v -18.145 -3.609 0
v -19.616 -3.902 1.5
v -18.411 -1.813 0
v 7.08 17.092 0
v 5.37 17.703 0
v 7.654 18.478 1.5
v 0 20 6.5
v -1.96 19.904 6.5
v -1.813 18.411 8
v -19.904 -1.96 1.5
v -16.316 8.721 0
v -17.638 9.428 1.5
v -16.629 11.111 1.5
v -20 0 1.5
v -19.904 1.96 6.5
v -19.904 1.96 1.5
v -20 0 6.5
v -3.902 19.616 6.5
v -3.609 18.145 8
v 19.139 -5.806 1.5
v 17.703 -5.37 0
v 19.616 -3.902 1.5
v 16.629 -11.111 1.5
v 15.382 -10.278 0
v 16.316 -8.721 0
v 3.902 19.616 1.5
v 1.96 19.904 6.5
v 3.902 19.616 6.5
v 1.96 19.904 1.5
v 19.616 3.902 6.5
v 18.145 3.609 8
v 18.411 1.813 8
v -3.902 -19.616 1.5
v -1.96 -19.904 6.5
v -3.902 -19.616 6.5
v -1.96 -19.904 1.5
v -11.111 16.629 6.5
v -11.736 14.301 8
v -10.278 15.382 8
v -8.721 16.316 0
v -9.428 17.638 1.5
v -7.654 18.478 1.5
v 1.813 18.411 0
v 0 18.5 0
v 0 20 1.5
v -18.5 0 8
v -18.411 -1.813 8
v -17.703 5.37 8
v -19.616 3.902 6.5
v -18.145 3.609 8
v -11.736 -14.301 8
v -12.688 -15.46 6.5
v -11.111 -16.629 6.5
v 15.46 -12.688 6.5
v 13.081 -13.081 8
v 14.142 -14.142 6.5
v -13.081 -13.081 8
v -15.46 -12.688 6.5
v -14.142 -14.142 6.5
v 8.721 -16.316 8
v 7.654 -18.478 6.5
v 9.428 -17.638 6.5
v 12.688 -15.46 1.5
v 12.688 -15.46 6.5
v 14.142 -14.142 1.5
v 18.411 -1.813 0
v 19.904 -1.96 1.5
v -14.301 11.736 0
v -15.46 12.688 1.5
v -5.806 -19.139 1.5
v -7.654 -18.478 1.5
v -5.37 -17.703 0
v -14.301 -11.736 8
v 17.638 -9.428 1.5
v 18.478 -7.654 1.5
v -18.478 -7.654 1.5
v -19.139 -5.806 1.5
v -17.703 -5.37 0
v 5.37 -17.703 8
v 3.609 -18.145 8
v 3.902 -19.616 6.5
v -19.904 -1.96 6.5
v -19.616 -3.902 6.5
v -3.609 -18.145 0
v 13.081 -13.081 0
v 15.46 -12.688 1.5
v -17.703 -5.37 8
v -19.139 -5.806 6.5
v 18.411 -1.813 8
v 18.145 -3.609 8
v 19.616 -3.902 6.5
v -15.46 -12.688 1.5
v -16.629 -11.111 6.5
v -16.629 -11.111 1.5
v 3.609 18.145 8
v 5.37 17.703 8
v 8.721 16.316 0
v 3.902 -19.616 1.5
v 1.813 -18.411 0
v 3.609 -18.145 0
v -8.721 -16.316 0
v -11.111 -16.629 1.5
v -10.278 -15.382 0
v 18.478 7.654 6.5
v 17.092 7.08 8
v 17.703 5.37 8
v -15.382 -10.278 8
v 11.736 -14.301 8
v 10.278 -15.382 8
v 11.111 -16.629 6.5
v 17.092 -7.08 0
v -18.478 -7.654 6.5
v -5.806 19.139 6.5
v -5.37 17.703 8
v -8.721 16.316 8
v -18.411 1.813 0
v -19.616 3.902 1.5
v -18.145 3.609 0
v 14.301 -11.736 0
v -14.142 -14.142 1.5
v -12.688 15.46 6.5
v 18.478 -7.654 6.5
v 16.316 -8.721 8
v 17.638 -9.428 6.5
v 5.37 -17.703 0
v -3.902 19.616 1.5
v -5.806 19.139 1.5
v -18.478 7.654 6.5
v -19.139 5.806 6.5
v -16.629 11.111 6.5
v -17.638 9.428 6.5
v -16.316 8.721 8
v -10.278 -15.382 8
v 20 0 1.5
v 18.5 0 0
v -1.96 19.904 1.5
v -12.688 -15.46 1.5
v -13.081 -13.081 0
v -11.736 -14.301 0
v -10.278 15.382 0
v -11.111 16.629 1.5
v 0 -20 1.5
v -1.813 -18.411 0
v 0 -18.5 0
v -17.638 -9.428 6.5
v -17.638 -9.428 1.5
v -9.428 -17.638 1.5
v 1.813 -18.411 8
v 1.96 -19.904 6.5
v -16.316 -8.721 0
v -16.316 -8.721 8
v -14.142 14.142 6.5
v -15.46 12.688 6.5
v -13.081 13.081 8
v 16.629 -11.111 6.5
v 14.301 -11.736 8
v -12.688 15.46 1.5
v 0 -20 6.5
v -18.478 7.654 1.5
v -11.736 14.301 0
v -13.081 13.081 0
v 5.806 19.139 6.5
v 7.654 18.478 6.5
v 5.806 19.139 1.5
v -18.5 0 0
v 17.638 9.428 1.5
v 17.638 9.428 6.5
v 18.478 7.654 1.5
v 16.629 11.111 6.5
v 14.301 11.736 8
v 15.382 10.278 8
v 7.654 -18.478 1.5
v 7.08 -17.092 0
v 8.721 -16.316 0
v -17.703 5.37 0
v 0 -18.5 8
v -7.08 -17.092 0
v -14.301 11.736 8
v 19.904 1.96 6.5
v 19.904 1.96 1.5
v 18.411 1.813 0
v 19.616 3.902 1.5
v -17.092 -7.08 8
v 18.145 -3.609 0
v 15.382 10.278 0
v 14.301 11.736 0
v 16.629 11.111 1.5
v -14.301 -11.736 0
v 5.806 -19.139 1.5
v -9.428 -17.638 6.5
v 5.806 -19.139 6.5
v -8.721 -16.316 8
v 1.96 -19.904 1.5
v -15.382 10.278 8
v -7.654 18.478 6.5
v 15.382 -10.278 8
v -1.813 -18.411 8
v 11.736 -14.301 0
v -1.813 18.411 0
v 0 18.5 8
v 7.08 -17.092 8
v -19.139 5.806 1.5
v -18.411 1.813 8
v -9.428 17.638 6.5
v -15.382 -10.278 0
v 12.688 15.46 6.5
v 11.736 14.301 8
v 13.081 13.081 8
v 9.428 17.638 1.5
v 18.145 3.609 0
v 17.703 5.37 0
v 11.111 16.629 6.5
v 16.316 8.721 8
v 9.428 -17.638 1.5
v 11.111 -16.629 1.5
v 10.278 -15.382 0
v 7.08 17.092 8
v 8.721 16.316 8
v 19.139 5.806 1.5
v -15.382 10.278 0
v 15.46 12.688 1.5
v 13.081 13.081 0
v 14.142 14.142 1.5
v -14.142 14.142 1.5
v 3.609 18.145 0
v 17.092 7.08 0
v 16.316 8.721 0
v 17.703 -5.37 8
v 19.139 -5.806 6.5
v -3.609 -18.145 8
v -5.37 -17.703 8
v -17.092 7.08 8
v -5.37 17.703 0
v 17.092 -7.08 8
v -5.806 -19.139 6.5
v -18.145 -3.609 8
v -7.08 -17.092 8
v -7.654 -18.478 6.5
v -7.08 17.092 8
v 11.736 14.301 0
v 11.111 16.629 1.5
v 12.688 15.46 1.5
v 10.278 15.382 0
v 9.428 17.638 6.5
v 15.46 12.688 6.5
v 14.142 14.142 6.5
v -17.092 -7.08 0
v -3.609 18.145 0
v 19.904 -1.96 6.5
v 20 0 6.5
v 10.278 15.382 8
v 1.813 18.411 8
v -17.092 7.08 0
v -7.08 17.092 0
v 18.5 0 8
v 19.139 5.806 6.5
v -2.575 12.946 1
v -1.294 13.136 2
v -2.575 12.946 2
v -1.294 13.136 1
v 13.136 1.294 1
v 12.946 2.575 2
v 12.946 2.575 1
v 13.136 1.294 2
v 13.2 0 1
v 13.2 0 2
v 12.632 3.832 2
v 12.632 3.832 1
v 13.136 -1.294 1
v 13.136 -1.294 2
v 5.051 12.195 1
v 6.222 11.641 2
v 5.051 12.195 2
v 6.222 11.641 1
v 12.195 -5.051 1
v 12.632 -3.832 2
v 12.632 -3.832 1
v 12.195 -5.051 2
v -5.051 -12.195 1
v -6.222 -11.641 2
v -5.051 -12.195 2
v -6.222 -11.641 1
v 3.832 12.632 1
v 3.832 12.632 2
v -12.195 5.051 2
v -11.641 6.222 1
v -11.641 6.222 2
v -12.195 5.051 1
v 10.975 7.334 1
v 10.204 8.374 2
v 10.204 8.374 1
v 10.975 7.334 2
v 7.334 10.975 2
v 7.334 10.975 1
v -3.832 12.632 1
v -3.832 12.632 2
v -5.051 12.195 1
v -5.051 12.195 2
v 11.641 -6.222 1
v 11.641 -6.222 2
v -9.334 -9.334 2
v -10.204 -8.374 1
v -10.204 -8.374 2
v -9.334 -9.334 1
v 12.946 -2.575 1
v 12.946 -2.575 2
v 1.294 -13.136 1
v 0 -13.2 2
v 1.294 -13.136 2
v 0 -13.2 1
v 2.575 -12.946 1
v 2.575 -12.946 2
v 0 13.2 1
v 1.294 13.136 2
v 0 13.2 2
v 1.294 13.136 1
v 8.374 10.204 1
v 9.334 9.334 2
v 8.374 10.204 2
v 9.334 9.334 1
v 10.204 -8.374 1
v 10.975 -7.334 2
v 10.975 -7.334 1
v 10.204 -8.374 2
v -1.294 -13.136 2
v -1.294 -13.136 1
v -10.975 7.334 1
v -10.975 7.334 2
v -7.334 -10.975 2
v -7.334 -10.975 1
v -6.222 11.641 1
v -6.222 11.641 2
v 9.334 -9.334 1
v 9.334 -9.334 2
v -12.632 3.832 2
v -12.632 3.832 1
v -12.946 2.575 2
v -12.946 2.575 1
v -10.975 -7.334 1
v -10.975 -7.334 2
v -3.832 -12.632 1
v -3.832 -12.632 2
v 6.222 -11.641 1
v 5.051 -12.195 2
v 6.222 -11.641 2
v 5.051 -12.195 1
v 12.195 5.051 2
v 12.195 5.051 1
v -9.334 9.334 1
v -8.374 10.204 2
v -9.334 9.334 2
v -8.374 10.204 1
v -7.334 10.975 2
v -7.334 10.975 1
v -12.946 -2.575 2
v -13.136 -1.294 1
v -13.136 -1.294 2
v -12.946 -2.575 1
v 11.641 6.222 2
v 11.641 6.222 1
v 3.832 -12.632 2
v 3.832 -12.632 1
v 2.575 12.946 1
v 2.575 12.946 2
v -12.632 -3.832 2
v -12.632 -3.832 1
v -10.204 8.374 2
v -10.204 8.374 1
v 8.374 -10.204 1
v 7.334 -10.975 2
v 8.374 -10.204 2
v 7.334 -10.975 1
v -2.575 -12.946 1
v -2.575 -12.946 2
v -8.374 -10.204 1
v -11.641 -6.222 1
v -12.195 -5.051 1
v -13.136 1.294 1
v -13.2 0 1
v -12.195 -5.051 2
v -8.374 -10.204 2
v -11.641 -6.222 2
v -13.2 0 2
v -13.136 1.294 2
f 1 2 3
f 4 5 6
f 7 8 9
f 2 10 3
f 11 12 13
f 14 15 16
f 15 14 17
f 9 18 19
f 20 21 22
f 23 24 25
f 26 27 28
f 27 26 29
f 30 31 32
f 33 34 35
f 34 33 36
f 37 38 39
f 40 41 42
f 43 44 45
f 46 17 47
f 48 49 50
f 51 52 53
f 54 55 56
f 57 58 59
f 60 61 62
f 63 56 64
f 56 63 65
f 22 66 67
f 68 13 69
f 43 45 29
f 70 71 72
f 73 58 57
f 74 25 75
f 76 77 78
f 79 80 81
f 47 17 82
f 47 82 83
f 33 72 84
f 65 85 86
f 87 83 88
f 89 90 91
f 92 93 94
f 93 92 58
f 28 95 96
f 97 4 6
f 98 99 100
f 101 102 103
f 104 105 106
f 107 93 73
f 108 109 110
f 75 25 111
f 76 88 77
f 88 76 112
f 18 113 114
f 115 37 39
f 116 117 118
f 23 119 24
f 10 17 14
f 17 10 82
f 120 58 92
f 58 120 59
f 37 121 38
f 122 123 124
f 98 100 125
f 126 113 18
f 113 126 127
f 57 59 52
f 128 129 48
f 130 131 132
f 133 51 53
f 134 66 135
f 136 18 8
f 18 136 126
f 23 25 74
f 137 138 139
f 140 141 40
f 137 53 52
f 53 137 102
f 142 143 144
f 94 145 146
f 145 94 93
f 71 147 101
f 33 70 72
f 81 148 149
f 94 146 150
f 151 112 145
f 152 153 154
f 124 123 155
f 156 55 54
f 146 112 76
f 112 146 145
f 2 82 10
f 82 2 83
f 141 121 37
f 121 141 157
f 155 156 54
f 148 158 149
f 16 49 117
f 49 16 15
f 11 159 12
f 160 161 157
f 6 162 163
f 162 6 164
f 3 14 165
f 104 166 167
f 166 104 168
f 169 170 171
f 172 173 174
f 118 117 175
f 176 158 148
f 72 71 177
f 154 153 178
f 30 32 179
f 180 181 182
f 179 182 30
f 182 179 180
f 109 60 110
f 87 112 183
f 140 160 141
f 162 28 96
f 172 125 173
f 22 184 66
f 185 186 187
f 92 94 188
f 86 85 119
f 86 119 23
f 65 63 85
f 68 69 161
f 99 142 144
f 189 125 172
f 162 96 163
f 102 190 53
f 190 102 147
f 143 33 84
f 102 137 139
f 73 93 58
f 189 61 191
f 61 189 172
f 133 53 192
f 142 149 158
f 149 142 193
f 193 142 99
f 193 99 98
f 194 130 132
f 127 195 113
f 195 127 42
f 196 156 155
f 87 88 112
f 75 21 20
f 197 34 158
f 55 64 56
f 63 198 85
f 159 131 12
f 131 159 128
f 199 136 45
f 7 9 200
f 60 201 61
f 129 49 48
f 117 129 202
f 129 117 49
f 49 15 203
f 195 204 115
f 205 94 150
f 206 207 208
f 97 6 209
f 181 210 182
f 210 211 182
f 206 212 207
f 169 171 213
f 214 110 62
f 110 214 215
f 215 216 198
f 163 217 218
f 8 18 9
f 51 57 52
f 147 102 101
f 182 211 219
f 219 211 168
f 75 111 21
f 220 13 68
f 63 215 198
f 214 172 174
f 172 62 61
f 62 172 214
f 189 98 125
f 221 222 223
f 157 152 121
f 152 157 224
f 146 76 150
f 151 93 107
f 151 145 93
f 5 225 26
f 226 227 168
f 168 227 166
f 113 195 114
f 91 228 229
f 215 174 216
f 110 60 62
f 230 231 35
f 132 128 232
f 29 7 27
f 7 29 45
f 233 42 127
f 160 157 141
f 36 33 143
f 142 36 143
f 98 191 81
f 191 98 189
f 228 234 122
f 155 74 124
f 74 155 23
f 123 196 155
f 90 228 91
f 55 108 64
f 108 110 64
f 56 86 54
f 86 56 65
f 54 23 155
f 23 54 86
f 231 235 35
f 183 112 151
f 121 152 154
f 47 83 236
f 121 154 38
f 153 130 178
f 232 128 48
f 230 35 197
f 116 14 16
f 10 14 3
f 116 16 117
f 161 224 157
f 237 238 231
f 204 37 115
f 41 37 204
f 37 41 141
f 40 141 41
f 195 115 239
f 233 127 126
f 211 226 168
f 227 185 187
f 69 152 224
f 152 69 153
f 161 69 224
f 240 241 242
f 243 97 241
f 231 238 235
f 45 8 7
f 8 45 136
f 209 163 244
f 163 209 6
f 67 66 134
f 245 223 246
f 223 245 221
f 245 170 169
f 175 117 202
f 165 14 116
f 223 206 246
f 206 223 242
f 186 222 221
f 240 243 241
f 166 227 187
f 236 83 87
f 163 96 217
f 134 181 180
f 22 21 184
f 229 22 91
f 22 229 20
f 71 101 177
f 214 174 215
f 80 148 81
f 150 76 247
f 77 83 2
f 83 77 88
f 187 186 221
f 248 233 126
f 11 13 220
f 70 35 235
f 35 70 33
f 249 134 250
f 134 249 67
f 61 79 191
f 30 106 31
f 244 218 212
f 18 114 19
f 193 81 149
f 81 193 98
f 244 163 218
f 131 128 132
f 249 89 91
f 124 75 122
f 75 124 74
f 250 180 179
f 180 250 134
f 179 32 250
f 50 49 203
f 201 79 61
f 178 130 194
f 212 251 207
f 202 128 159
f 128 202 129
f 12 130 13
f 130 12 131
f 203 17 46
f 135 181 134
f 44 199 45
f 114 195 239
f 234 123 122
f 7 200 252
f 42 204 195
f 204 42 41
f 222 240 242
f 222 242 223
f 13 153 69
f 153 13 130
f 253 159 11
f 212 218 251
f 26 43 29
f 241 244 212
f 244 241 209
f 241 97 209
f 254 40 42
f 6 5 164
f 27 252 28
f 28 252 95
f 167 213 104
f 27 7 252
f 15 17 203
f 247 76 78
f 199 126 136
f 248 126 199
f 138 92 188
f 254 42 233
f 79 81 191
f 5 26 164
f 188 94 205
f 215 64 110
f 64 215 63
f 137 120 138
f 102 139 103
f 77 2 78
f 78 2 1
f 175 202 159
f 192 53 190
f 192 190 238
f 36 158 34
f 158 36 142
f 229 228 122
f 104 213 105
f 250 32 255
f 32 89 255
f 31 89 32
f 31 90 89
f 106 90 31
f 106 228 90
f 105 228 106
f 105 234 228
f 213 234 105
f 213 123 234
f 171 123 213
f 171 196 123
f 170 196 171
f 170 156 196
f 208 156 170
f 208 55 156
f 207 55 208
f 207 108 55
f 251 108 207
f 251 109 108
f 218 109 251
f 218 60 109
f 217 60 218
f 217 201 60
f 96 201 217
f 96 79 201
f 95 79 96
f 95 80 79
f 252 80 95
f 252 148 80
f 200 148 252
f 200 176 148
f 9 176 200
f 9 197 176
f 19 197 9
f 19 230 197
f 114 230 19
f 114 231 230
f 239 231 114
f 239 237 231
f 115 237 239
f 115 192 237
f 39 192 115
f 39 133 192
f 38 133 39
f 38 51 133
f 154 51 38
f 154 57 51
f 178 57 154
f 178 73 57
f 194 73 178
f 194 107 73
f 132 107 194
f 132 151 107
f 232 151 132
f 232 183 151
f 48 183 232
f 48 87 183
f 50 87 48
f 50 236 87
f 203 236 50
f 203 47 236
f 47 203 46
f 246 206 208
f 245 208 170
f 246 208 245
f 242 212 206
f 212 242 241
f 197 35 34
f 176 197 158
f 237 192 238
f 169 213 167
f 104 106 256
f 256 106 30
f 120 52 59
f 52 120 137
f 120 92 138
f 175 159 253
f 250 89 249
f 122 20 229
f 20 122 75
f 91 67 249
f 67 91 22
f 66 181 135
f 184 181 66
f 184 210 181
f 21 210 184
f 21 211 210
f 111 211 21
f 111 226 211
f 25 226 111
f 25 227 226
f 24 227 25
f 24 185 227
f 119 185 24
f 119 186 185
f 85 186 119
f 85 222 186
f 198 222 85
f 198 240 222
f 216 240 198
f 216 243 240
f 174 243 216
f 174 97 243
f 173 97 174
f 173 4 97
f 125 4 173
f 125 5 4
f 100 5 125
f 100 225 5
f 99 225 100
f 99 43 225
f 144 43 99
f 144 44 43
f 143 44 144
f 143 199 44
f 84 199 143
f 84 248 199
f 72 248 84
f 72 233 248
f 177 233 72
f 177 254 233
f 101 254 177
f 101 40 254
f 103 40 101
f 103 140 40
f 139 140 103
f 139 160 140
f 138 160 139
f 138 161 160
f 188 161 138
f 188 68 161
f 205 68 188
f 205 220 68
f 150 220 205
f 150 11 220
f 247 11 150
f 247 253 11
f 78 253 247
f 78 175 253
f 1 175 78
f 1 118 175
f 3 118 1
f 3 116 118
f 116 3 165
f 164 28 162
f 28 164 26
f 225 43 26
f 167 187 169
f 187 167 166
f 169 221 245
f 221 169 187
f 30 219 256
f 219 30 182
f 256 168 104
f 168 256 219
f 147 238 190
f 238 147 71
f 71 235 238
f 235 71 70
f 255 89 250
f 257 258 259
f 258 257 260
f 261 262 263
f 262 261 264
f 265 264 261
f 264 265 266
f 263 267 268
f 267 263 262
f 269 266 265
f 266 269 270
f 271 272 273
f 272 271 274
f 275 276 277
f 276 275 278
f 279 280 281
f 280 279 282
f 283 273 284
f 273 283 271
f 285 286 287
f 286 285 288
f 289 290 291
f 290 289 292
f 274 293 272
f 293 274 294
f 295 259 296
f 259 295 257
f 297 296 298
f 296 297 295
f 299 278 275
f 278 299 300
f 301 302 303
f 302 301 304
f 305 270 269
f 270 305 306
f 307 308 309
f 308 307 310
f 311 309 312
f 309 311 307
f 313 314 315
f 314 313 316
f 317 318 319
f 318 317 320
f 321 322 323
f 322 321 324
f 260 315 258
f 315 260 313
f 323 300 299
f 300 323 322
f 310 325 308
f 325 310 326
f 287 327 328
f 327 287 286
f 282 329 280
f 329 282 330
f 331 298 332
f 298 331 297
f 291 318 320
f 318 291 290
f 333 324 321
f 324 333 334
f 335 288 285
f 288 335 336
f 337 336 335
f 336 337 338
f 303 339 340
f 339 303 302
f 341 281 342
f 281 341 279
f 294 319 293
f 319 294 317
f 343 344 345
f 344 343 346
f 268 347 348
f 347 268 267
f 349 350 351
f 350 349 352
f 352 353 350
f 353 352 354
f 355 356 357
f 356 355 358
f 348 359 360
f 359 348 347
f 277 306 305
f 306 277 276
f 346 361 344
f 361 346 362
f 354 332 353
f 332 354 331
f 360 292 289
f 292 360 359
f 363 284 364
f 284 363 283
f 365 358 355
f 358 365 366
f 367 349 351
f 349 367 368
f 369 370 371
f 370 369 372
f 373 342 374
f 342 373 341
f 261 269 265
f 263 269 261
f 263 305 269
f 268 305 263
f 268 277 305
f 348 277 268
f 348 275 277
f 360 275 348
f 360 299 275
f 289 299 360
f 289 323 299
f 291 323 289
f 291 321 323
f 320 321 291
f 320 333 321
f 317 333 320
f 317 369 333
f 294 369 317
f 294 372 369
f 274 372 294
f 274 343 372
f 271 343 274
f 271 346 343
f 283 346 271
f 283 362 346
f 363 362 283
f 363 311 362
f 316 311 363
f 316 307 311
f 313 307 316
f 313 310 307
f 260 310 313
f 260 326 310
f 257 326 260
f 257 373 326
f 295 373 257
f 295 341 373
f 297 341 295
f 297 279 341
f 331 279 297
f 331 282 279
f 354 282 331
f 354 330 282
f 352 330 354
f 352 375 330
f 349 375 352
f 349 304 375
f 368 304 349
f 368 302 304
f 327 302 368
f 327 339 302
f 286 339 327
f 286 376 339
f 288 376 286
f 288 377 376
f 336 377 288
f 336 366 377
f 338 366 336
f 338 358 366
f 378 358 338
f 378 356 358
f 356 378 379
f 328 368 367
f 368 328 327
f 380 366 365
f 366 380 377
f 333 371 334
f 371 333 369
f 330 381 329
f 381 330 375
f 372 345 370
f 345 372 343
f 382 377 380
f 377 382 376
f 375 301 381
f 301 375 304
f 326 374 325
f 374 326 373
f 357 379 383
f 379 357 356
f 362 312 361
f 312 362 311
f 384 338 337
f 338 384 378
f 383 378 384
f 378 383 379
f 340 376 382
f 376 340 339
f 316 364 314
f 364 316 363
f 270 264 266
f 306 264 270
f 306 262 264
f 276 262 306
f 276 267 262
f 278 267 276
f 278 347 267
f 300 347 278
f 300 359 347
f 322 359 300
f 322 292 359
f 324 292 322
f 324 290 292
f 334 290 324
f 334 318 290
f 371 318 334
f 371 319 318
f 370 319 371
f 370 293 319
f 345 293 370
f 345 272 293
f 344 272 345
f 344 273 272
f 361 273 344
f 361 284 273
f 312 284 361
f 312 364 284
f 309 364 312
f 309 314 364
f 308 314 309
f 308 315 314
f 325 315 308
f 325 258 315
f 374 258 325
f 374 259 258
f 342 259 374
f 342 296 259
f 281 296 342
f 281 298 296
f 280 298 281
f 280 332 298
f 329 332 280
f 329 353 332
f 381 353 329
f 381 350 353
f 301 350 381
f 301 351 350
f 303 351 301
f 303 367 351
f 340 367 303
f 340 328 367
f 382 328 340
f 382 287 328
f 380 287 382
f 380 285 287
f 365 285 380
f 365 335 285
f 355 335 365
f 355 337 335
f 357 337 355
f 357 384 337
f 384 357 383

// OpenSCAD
// file: ../../sorgenti/parametri.scad
// ============================================================
// parametri.scad — tutte le misure del progetto, in millimetri
// ------------------------------------------------------------
// Unica fonte di verità per la geometria: se cambia un
// componente, si cambia QUI e si rigenerano gli STL con
//   ./modelli-3d/genera-stl.sh
//
// Le misure marcate [VERIFICARE] vanno ricontrollate col
// calibro quando arrivano i pezzi, prima di stampare il case.
// ============================================================

// Risoluzione delle curve: 48 per lavorare, 96 per gli STL finali.
RISOLUZIONE = 64;

// ---------- Tolleranze di stampa (Kobra S2 / S3 Max, ugello 0,4) ----------
GIOCO        = 0.35;  // gioco fra due pezzi stampati che si accoppiano
GIOCO_FORO   = 0.25;  // sovramisura dei fori per i componenti
PARETE_MIN   = 1.6;   // spessore minimo di una parete portante (4 linee)

// ---------- Scocca ----------
// Scocca = pareti + coperchio in UN SOLO pezzo (si stampa capovolta).
// Il fondo è una piastra separata, avvitata dall'esterno.
BOX_X        = 130;   // larghezza
BOX_Y        = 130;   // profondità
BOX_Z        = 100;   // altezza totale, fondo compreso
PARETE       = 2.4;   // spessore pareti (3 perimetri a 0,8)
TOP_SP       = 5.0;   // spessore del coperchio (serve per il dado del tasto arcade)
RAGGIO_VERT  = 8;     // raggio degli angoli verticali (spec: >= 5)
RAGGIO_TOP   = 3;     // raccordo del bordo superiore
FONDO_SP     = 3.0;   // spessore della piastra di fondo
FONDO_INCASSO = FONDO_SP;  // il fondo è incassato e a filo con le pareti

// ---------- Zona NFC sul coperchio ----------
NFC_D        = 62;    // diametro dello scasso di appoggio
NFC_PROF     = 3.0;   // profondità dello scasso
NFC_X        = 0;     // posizione del centro (X=0 = centro scatola)
NFC_Y        = 28;    // spostato verso il retro, davanti ci stanno i comandi
NFC_TACCA_D  = 14;    // tacche laterali per sollevare il vinile con un dito
// Fondo dello scasso = TOP_SP - NFC_PROF = 2,0 mm (limite di specifica)

// ---------- Cursore volume (potenziometro a slitta B10K) ----------
CURSORE_CORSA   = 60;    // corsa utile [VERIFICARE sul pezzo]
CURSORE_LUNG    = 75;    // lunghezza totale del corpo [VERIFICARE]
CURSORE_LARG    = 9;     // larghezza del corpo [VERIFICARE]
CURSORE_ALT     = 9;     // altezza del corpo sopra il PCB [VERIFICARE]
CURSORE_LEVA_X  = 2.0;   // spessore della levetta
CURSORE_LEVA_Y  = 6.0;   // larghezza della levetta
CURSORE_FESSURA_W = 3.2; // larghezza della fessura nel coperchio
CURSORE_Y       = -16;   // posizione sul coperchio
CURSORE_Z_SOTTO = 7;     // quota del corpo del potenziometro sotto la faccia interna

// ---------- Tasti arcade ----------
// "30 mm" è il diametro del cappuccio: il foro di montaggio è 28 mm
// sui modelli con ghiera filettata. [VERIFICARE col pezzo in mano]
TASTO_FORO   = 28.0;
TASTO_CAPPUCCIO = 33;
TASTO_X      = 35;    // centri a +/- 35 -> 70 mm fra i centri
TASTO_Y      = -42;

// ---------- Display e-paper 2,13" (Waveshare 250x122) ----------
EPD_PCB_X    = 59.2;  // [VERIFICARE]
EPD_PCB_Z    = 29.2;  // [VERIFICARE]
EPD_PCB_SP   = 1.2;   // spessore del modulo senza componenti
EPD_FIN_X    = 50;    // finestra visibile (area attiva 48,55 x 23,7)
EPD_FIN_Z    = 25.5;
EPD_Z        = 76;    // quota del centro finestra sulla parete frontale
EPD_PARETE   = 1.2;   // parete sottile davanti al display (0 = finestra aperta)

// ---------- Altoparlante ----------
ALT_D        = 40;    // diametro esterno [VERIFICARE]
ALT_ALT      = 6;     // altezza col magnete [VERIFICARE]
ALT_Z        = 32;    // quota del centro sulla parete frontale
ALT_GRIGLIA_D   = 1.8; // fori della griglia (spec: <= 2 mm)
ALT_CAMERA_PROF = 12;  // profondità della camera chiusa dietro il cono
ALT_TUBO_OD     = 52;  // diametro esterno del tubo portaltoparlante
ALT_TUBO_LUNG   = 12;  // lunghezza del tubo verso l'interno
ALT_CAMERA_SEDE = 46.4;// controforo in cui si innesta la camera

// ---------- Lettore PN5180 ----------
// Fissato sotto il coperchio con biadesivo + nervature di contenimento.
// Le nervature sono aperte su un lato: il modulo entra a scorrere.
PN_X         = 58;    // ingombro del modulo, lato X [VERIFICARE]
PN_Y         = 47;    // ingombro del modulo, lato Y [VERIFICARE]
PN_ALT       = 8;     // altezza totale coi componenti [VERIFICARE]

// ---------- Retro: USB-C e microSD ----------
USB_X        = -28;   // posizione del centro sulla parete di fondo
USB_Z        = 18;
USB_W        = 11.0;  // foro per il connettore USB-C del TP4056
USB_H        = 6.0;
SD_X         = 28;
SD_Z         = 18;
SD_W         = 14.0;  // fessura di inserimento della microSD
SD_H         = 3.4;

// ---------- Fondo: interruttore, tasto genitori, vano batteria ----------
SW_X         = -40;   // interruttore a slitta da pannello
SW_Y         = -53;
SW_FORO_X    = 13.0;  // [VERIFICARE: SS12D00 o simile]
SW_FORO_Y    = 8.0;
SW_VITI      = 19.5;  // distanza fra le due viti di fissaggio
SW_INCASSO   = 1.6;   // incasso per non sporgere dal fondo

GEN_X        = 40;    // tasto genitori (tattile 6 mm), incassato
GEN_Y        = -53;
GEN_FORO_D   = 6.0;   // passa un polpastrello adulto, non la mano di un bimbo
GEN_POZZO_D  = 11;    // pozzetto di incasso
GEN_POZZO_H  = 1.8;

// Portabatteria con l'asse lungo su Y, sul lato destro: la basetta
// millefori gli passa sopra senza toccarlo.
BATT_HOLDER_X = 24;   // larghezza [VERIFICARE]
BATT_HOLDER_Y = 78;   // lunghezza [VERIFICARE]
BATT_HOLDER_Z = 20;
BATT_X        = 24;   // centro del vano batteria
BATT_Y        = 0;
SPORT_X       = 26;   // apertura dello sportellino batteria
SPORT_Y       = 72;
SPORT_PIASTRA_X = 40; // piastrina dello sportellino
SPORT_PIASTRA_Y = 82;
SPORT_SP      = 2.5;  // spessore dello sportellino
SPORT_RABBET  = 1.2;  // incasso dello sportellino (resta a filo)
SPORT_VITI_DX = 14;   // viti dello sportellino, scostamento da BATT_X
SPORT_VITI_DY = 36;
AUTOFIL_D     = 2.1;  // preforo per vite autofilettante M2,5 nel PETG

// ---------- Viti e inserti ----------
VITE_D       = 2.5;        // M2,5
VITE_FORO    = 2.8;        // passaggio della vite
VITE_TESTA_D = 5.0;        // svasatura della testa
INSERTO_D    = 3.6;        // inserto a caldo M2,5 [VERIFICARE col lotto]
INSERTO_H    = 5.0;
BOSS_D       = 7.5;        // diametro del pilastrino che ospita l'inserto
BOSS_OFF     = 6;          // distanza del pilastrino dalla parete interna

// ---------- Elettronica interna ----------
MILLEFORI_X  = 90;    // basetta millefori (90 x 70)
MILLEFORI_Y  = 70;
MILLEFORI_Z  = 28;    // quota della basetta sopra il fondo
MILLEFORI_SP = 1.6;
MILLEFORI_VITI_X = 41; // colonnine di sostegno
MILLEFORI_VITI_Y = 31;

// ---------- Statuine ----------
ST_BASE_D    = 40;    // cilindro di base
ST_BASE_H    = 8;
ST_TAG_D     = 25;    // tag NTAG213 adesivo
ST_TAG_SEDE_D = 26.4; // sede del tag, con gioco
ST_TAG_SEDE_H = 1.0;  // profondità della sede
ST_TAG_FONDO = 1.0;   // spessore sotto il tag (spec: 1 mm dal fondo)
ST_SMUSSO    = 1.5;   // smusso del bordo della base

// ---------- Vinili ----------
VIN_D        = 60;
VIN_H        = 4;
VIN_SOLCO_H  = 0.4;   // rilievo dei solchi
VIN_ETICH_D  = 24;    // etichetta centrale
VIN_RAGGIO   = 1.2;   // raccordo del bordo

// ---------- Calibro parti piccole (EN 71-1) ----------
CAL_D        = 31.7;
CAL_H_MIN    = 25.4;
CAL_H_MAX    = 57.1;
// file: ../../sorgenti/libreria.scad
// ============================================================
// libreria.scad — forme di base riusate da tutti i pezzi
// ============================================================
include <parametri.scad>

$fn = RISOLUZIONE;

// Prisma a sezione rettangolare con angoli arrotondati.
module piastra(x, y, h, r) {
    linear_extrude(height = h)
        offset(r = r) square([x - 2*r, y - 2*r], center = true);
}

// Scatola piena con angoli verticali arrotondati (rv) e bordo
// superiore raccordato (rt). Il raccordo è approssimato a gradini
// uniti con hull(): resta liscio e si stampa senza supporti.
module scatola_arrotondata(x, y, z, rv, rt, passi = 12) {
    union() {
        piastra(x, y, z - rt, rv);
        for (i = [0 : passi - 1]) {
            a0 = 90 * i / passi;
            a1 = 90 * (i + 1) / passi;
            k0 = rt * (1 - cos(a0));  k1 = rt * (1 - cos(a1));
            h0 = rt * sin(a0);        h1 = rt * sin(a1);
            hull() {
                translate([0, 0, z - rt + h0])
                    piastra(x - 2*k0, y - 2*k0, 0.02, max(rv - k0, 0.6));
                translate([0, 0, z - rt + h1])
                    piastra(x - 2*k1, y - 2*k1, 0.02, max(rv - k1, 0.6));
            }
        }
    }
}

// Foro di passaggio per vite con svasatura della testa (testa in basso,
// si avvita dal basso verso l'alto).
module foro_svasato(h = 10, d = VITE_FORO, testa_d = VITE_TESTA_D, testa_h = 1.6) {
    translate([0, 0, -0.1]) cylinder(h = h + 0.2, d = d);
    translate([0, 0, -0.1]) cylinder(h = testa_h + 0.1, d1 = testa_d, d2 = d);
}

// Pilastrino con sede per inserto a caldo M2,5 (si inserisce dal basso).
module boss_inserto(h = 12, d = BOSS_D) {
    difference() {
        cylinder(h = h, d = d);
        translate([0, 0, -0.1]) cylinder(h = INSERTO_H + 0.1, d = INSERTO_D);
        // scarico sopra l'inserto, per la punta della vite
        translate([0, 0, INSERTO_H]) cylinder(h = h, d = VITE_D + 0.4);
    }
}

// Griglia di fori a nido d'ape dentro un cerchio di diametro d_area.
module griglia_tonda(d_area, spessore, d_foro = ALT_GRIGLIA_D, passo = 3.2) {
    n = ceil(d_area / passo) + 2;
    for (i = [-n : n], j = [-n : n]) {
        x = i * passo + (abs(j) % 2) * passo / 2;
        y = j * passo * 0.866;
        if (sqrt(x*x + y*y) <= (d_area - d_foro) / 2)
            translate([x, y, -0.1]) cylinder(h = spessore + 0.2, d = d_foro);
    }
}

// Fessura allungata (slot) con estremi arrotondati, asse X.
module fessura(lung, larg, h) {
    hull() {
        translate([-(lung - larg)/2, 0, 0]) cylinder(h = h, d = larg);
        translate([ (lung - larg)/2, 0, 0]) cylinder(h = h, d = larg);
    }
}

// Scritta in rilievo (per i provini e le etichette).
module scritta(t, dim = 6, alt = 0.6) {
    linear_extrude(height = alt)
        text(t, size = dim, halign = "center", valign = "center",
             font = "Helvetica:style=Bold");
}

// Freccia piena, punta verso +X, usata per le icone dei tasti.
module freccia(lung = 16, larg = 14, alt = 0.8) {
    gambo = larg / 5;          // mezza larghezza del gambo
    testa = lung * 0.45;       // lunghezza della punta
    linear_extrude(height = alt)
        polygon([[-lung/2, -gambo], [lung/2 - testa, -gambo],
                 [lung/2 - testa, -larg/2], [lung/2, 0],
                 [lung/2 - testa, larg/2], [lung/2 - testa, gambo],
                 [-lung/2, gambo]]);
}

// Icona "volume": tre barrette crescenti, asse X.
module icona_volume(n = 3, alt = 0.8, passo = 3.2, base = 2.0, cresc = 1.6) {
    for (i = [0 : n - 1])
        translate([i * passo, 0, 0])
            linear_extrude(height = alt)
                square([1.8, base + i * cresc], center = true);
}

// Cava a sezione rettangolare arrotondata, asse di estrusione Y.
// Utile per finestre e fessure nelle pareti verticali.
module cava_y(x, z, prof, r = 1.5) {
    rotate([90, 0, 0])
        linear_extrude(height = prof, center = true)
            offset(r = r) square([x - 2*r, z - 2*r], center = true);
}

// Pilastrino che parte dal piano del fondo e ospita un inserto a caldo
// (inserito dal basso). La punta conica in alto lo rende stampabile
// anche a scatola capovolta.
module boss_fondo(h = 12) {
    union() {
        difference() {
            cylinder(h = h, d = BOSS_D);
            translate([0, 0, -0.1]) cylinder(h = INSERTO_H + 0.1, d = INSERTO_D);
            translate([0, 0, INSERTO_H]) cylinder(h = h, d = VITE_D + 0.6);
        }
        translate([0, 0, h]) cylinder(h = BOSS_D/2, d1 = BOSS_D, d2 = 0.4);
    }
}

// Pilastrino appeso al soffitto (coperchio): l'inserto entra dal basso.
module boss_soffitto(h = 7) {
    difference() {
        translate([0, 0, -h]) cylinder(h = h, d = BOSS_D);
        translate([0, 0, -h - 0.1]) cylinder(h = INSERTO_H + 0.1, d = INSERTO_D);
    }
}
// main file
// ============================================================
// base-statuina.scad — base con sede del tag NFC
// ------------------------------------------------------------
// Cilindro Ø40 x 8 con la sede del tag a 1 mm dal fondo: fra
// tag e antenna restano 1 mm di base + 2 mm di piatto NFC.
// Sopra ci va il personaggio (statuina-orso.scad) oppure si
// incolla una figurina comprata.
//
// STAMPA: appoggiata sul piano. Mettere una pausa (M600 /
// "change filament") alla quota Z = ST_TAG_FONDO + ST_TAG_SEDE_H
// (2,0 mm): si appoggia il tag nella sede e si riprende.
// In alternativa stampare con TAPPO = true e incollare il
// dischetto dopo aver messo il tag.
// ============================================================
include <../../sorgenti/libreria.scad>

TAPPO = false;   // true = sede aperta sotto + tappo da incollare

base_statuina();
if (TAPPO) translate([ST_BASE_D + 8, 0, 0]) tappo_base();

module base_statuina() {
    difference() {
        corpo_base();
        sede_tag();
    }
}

module corpo_base() {
    // cilindro con smussi sopra e sotto: nessuno spigolo vivo
    hull() {
        translate([0, 0, 0])
            cylinder(h = 0.01, d = ST_BASE_D - 2*ST_SMUSSO);
        translate([0, 0, ST_SMUSSO])
            cylinder(h = ST_BASE_H - 2*ST_SMUSSO, d = ST_BASE_D);
        translate([0, 0, ST_BASE_H - 0.01])
            cylinder(h = 0.01, d = ST_BASE_D - 2*ST_SMUSSO);
    }
}

module sede_tag() {
    if (TAPPO) {
        // sede aperta verso il basso, si chiude col tappo
        translate([0, 0, -0.1])
            cylinder(h = ST_TAG_FONDO + ST_TAG_SEDE_H + 0.1, d = ST_TAG_SEDE_D);
    } else {
        translate([0, 0, ST_TAG_FONDO])
            cylinder(h = ST_TAG_SEDE_H, d = ST_TAG_SEDE_D);
    }
}

// Tappo da incollare quando non si usa la pausa in stampa.
module tappo_base() {
    cylinder(h = ST_TAG_FONDO - 0.2, d = ST_TAG_SEDE_D - 0.3);
}
